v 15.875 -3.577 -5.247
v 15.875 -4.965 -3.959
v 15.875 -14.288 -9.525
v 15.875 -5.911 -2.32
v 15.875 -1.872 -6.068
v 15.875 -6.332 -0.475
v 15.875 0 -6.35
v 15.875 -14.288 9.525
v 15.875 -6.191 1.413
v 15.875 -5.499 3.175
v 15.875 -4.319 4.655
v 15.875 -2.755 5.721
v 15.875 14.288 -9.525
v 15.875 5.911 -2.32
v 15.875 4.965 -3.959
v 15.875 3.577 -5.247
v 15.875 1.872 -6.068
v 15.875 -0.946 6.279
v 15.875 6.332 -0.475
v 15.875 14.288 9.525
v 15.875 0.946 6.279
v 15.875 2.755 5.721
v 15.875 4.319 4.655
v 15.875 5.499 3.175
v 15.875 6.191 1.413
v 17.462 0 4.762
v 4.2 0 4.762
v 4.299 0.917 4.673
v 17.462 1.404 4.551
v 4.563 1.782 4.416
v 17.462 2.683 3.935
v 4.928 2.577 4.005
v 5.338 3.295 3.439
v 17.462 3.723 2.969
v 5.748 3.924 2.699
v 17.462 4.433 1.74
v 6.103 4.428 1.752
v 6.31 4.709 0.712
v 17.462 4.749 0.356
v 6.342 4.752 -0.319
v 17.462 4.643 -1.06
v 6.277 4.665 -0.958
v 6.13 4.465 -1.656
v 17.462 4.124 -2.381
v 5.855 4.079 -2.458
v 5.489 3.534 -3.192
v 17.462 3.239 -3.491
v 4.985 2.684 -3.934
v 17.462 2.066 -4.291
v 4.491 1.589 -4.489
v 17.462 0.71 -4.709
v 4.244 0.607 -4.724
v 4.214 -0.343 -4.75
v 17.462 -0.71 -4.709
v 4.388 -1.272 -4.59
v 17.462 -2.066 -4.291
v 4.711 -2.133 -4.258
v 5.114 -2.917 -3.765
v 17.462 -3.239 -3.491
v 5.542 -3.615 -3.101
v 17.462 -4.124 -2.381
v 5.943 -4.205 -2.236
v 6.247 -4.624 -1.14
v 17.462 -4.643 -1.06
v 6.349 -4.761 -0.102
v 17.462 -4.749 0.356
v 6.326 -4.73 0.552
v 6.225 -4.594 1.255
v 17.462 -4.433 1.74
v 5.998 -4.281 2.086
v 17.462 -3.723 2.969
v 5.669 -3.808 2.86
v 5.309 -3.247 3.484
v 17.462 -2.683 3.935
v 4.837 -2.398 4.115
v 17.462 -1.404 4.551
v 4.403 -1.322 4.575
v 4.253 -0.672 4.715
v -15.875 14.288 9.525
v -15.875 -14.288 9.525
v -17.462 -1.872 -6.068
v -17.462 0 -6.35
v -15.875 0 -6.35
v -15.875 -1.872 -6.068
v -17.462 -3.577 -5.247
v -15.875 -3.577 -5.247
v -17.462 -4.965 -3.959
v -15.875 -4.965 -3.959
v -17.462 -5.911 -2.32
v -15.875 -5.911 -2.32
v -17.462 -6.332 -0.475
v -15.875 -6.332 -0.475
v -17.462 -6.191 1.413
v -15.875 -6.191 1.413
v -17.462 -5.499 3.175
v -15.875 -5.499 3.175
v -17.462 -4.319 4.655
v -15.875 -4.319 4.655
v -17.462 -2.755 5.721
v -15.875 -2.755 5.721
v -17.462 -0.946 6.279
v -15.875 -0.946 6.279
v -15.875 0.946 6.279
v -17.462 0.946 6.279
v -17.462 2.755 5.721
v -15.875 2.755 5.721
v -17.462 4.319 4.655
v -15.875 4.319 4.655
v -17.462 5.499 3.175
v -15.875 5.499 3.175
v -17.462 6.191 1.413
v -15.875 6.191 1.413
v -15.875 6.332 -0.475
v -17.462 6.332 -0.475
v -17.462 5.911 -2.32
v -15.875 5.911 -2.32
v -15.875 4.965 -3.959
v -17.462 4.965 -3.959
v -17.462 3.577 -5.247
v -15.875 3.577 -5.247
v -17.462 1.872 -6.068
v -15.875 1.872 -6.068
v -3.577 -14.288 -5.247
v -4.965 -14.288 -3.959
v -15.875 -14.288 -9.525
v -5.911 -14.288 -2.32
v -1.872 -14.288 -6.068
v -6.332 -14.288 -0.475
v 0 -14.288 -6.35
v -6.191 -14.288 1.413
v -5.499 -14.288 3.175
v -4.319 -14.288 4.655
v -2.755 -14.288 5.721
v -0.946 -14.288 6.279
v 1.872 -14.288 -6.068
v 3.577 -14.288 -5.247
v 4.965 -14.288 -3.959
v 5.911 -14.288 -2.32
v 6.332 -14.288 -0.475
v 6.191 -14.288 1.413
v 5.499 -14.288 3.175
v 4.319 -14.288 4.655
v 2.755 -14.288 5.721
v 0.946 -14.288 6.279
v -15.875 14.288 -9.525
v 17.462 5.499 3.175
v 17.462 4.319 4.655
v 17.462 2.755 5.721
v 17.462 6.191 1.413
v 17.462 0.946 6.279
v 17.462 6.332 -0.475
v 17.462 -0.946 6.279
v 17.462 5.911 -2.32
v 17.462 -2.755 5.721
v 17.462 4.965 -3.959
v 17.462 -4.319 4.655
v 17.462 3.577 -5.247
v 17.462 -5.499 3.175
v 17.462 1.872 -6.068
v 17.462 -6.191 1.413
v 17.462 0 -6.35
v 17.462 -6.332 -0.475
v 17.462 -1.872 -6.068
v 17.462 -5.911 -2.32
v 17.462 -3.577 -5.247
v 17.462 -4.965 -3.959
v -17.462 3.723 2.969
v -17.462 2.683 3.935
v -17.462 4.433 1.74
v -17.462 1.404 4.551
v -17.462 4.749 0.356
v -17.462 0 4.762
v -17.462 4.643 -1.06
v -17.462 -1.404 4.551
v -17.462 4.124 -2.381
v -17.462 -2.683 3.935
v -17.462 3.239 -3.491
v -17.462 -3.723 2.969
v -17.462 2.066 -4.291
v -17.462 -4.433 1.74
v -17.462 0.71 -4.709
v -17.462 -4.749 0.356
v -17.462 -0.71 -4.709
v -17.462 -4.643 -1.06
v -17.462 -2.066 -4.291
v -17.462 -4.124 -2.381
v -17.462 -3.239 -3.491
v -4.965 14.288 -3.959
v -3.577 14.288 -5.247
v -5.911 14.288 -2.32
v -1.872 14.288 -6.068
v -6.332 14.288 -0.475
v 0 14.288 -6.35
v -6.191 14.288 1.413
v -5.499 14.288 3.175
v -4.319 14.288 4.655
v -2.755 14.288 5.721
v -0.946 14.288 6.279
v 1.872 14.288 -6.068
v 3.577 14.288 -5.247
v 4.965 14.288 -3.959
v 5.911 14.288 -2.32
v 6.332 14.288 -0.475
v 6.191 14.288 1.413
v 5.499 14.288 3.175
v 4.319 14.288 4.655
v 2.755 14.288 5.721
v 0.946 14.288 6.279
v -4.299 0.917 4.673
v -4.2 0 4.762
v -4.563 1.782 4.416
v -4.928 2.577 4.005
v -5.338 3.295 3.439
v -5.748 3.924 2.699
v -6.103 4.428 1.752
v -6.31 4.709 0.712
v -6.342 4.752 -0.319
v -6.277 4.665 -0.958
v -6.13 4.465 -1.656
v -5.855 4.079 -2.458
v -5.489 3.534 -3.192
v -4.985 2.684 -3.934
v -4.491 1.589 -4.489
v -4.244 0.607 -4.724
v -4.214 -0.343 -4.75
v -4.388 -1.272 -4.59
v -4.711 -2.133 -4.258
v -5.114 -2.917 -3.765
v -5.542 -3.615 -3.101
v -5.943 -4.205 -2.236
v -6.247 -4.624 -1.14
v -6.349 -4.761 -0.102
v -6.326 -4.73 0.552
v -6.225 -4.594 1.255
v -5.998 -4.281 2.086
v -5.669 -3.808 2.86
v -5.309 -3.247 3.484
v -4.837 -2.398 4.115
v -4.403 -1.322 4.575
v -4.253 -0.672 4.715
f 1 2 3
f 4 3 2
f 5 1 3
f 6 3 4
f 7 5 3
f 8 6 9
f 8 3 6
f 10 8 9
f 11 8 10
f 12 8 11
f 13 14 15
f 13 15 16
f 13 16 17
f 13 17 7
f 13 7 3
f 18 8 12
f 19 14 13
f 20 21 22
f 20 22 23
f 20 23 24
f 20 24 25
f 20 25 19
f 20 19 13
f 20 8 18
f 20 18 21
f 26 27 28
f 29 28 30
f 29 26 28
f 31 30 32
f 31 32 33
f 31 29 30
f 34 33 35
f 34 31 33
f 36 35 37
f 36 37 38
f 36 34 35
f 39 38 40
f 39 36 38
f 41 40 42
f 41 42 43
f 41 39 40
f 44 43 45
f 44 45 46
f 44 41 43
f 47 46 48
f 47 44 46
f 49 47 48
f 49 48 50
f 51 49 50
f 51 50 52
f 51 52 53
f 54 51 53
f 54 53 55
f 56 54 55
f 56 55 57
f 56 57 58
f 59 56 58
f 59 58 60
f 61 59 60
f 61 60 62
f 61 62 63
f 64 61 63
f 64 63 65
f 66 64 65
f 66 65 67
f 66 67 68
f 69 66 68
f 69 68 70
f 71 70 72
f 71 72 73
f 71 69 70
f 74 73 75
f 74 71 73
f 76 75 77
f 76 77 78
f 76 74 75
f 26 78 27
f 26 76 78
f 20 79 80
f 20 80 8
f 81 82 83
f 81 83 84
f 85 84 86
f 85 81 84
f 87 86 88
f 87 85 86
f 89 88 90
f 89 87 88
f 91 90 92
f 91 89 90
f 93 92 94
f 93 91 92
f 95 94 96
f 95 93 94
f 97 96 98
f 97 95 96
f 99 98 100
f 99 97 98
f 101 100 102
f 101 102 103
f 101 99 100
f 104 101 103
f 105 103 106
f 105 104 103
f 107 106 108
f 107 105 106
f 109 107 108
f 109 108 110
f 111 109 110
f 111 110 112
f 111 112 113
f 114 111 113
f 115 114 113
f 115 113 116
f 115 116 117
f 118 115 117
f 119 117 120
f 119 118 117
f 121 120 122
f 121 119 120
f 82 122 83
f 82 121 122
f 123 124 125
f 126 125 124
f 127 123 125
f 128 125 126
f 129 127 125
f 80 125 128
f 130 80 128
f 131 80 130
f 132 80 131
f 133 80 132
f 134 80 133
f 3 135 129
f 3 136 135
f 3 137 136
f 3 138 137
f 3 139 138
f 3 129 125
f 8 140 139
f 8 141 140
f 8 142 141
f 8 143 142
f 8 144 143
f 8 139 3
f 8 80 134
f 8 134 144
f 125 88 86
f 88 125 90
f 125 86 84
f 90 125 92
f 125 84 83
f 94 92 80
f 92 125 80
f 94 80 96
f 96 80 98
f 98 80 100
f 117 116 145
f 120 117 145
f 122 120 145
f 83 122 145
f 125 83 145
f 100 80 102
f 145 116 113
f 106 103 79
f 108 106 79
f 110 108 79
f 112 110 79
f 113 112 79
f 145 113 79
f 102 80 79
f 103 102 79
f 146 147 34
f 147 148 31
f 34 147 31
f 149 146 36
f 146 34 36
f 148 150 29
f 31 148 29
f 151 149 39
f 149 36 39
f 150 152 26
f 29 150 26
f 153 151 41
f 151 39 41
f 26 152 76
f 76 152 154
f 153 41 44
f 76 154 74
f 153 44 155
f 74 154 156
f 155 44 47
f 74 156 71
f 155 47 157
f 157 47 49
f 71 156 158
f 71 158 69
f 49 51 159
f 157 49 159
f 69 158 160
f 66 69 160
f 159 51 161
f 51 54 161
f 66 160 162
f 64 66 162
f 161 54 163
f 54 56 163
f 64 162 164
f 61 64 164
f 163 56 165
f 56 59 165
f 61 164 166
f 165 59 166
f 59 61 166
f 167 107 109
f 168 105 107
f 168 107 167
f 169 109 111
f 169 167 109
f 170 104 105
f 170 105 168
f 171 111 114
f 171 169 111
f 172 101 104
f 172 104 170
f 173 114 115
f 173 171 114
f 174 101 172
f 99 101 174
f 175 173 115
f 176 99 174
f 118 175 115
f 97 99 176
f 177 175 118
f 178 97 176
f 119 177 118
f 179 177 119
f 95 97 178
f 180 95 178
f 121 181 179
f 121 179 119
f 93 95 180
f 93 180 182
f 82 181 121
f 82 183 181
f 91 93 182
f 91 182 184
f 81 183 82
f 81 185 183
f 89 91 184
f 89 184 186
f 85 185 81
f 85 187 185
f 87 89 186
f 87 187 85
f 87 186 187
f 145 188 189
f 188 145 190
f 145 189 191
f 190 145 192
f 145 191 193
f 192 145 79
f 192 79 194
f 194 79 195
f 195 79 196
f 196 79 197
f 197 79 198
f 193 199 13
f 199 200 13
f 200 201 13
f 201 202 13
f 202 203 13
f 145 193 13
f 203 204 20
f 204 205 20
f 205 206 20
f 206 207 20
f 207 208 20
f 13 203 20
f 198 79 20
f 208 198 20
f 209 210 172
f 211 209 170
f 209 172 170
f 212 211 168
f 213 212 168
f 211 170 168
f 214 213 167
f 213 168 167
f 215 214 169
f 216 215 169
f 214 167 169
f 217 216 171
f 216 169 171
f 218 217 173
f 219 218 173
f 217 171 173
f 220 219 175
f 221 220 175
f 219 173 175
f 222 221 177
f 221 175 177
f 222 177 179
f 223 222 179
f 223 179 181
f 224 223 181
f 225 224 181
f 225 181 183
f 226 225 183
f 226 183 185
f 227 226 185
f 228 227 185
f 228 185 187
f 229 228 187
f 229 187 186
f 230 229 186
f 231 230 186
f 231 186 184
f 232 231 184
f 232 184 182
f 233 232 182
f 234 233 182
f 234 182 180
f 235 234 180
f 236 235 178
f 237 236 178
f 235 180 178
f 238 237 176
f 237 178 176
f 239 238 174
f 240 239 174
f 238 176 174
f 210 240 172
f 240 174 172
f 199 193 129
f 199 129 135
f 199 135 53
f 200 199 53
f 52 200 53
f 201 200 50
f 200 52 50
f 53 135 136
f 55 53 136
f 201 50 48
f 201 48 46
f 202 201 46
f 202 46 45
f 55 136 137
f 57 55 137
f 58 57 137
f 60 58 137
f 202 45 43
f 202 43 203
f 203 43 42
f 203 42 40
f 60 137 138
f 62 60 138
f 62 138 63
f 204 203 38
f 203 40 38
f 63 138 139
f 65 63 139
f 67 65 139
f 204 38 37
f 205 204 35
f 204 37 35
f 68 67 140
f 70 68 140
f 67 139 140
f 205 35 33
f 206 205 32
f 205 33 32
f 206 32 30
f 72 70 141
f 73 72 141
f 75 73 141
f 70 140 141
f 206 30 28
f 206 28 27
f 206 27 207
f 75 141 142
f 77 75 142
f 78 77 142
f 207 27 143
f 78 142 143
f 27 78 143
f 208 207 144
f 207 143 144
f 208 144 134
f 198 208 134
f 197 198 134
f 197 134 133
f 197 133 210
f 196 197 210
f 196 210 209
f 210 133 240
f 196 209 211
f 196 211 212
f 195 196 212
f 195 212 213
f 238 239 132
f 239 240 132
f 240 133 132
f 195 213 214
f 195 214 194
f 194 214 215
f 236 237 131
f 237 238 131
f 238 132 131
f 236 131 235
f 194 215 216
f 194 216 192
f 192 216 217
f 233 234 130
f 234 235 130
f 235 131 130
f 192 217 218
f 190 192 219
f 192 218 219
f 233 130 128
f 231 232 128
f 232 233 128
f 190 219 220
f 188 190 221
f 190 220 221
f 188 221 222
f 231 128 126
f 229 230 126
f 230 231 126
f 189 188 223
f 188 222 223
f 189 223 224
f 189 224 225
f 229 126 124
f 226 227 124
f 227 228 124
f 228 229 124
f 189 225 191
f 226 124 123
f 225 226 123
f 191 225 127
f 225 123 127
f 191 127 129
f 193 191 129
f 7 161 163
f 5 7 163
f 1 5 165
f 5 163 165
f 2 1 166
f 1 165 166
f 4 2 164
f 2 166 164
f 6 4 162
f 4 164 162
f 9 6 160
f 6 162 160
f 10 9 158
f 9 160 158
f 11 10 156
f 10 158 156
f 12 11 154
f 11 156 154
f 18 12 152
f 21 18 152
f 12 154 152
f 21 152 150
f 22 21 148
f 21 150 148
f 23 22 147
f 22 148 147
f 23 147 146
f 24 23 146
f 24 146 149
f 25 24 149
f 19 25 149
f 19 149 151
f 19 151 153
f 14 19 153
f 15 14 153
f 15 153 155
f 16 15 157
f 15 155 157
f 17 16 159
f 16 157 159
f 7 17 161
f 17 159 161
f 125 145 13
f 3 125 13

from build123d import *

# Parameters (mm, degrees)
SKETCH1_W           = 31.75
SKETCH1_H           = 28.575
BOSS_EXTRUDE1_DEPTH = 9.525
SKETCH2_R           = 6.35
CUT_EXTRUDE1_DEPTH  = 35.048081811
SKETCH3_R           = 4.7625
CUT_EXTRUDE2_DEPTH  = 37.095993978
BOSS_EXTRUDE2_START = 1.5875
SKETCH4_R           = 6.35
SKETCH4_R_2         = 4.7625
BOSS_EXTRUDE2_DEPTH = 1.5875


with BuildPart() as part:
    # Sketch1 → Boss-Extrude1 (new, symmetric)
    with BuildSketch(Plane.XY):
        Rectangle(SKETCH1_W, SKETCH1_H)
    extrude(amount=BOSS_EXTRUDE1_DEPTH, both=True)

    # Sketch2 → Cut-Extrude1 (cut, through all)
    with BuildSketch(Plane.XZ.offset(14.2875)):
        with Locations(Location((0, 0, 0), (0, 0, 270))):
            Circle(SKETCH2_R)
    extrude(amount=-CUT_EXTRUDE1_DEPTH, mode=Mode.SUBTRACT)

    # Sketch3 → Cut-Extrude2 (cut, through all)
    with BuildSketch(Plane.ZY.offset(15.875)):
        Circle(SKETCH3_R)
    extrude(amount=-CUT_EXTRUDE2_DEPTH, mode=Mode.SUBTRACT)

    # Sketch4 → Boss-Extrude2 (add)
    with BuildSketch(Plane.ZY.offset(15.875).offset(BOSS_EXTRUDE2_START)):
        with Locations(Location((0, 0, 0), (0, 0, 180))):
            Circle(SKETCH4_R)
        Circle(SKETCH4_R_2, mode=Mode.SUBTRACT)
    boss_extrude2 = extrude(amount=-BOSS_EXTRUDE2_DEPTH)

    # Mirror1: Boss-Extrude2 across plane
    add(boss_extrude2.mirror(Plane(origin=(0, 0, 0), x_dir=(0, 0, 1), z_dir=(1, 0, 0))))


solid = part.part
